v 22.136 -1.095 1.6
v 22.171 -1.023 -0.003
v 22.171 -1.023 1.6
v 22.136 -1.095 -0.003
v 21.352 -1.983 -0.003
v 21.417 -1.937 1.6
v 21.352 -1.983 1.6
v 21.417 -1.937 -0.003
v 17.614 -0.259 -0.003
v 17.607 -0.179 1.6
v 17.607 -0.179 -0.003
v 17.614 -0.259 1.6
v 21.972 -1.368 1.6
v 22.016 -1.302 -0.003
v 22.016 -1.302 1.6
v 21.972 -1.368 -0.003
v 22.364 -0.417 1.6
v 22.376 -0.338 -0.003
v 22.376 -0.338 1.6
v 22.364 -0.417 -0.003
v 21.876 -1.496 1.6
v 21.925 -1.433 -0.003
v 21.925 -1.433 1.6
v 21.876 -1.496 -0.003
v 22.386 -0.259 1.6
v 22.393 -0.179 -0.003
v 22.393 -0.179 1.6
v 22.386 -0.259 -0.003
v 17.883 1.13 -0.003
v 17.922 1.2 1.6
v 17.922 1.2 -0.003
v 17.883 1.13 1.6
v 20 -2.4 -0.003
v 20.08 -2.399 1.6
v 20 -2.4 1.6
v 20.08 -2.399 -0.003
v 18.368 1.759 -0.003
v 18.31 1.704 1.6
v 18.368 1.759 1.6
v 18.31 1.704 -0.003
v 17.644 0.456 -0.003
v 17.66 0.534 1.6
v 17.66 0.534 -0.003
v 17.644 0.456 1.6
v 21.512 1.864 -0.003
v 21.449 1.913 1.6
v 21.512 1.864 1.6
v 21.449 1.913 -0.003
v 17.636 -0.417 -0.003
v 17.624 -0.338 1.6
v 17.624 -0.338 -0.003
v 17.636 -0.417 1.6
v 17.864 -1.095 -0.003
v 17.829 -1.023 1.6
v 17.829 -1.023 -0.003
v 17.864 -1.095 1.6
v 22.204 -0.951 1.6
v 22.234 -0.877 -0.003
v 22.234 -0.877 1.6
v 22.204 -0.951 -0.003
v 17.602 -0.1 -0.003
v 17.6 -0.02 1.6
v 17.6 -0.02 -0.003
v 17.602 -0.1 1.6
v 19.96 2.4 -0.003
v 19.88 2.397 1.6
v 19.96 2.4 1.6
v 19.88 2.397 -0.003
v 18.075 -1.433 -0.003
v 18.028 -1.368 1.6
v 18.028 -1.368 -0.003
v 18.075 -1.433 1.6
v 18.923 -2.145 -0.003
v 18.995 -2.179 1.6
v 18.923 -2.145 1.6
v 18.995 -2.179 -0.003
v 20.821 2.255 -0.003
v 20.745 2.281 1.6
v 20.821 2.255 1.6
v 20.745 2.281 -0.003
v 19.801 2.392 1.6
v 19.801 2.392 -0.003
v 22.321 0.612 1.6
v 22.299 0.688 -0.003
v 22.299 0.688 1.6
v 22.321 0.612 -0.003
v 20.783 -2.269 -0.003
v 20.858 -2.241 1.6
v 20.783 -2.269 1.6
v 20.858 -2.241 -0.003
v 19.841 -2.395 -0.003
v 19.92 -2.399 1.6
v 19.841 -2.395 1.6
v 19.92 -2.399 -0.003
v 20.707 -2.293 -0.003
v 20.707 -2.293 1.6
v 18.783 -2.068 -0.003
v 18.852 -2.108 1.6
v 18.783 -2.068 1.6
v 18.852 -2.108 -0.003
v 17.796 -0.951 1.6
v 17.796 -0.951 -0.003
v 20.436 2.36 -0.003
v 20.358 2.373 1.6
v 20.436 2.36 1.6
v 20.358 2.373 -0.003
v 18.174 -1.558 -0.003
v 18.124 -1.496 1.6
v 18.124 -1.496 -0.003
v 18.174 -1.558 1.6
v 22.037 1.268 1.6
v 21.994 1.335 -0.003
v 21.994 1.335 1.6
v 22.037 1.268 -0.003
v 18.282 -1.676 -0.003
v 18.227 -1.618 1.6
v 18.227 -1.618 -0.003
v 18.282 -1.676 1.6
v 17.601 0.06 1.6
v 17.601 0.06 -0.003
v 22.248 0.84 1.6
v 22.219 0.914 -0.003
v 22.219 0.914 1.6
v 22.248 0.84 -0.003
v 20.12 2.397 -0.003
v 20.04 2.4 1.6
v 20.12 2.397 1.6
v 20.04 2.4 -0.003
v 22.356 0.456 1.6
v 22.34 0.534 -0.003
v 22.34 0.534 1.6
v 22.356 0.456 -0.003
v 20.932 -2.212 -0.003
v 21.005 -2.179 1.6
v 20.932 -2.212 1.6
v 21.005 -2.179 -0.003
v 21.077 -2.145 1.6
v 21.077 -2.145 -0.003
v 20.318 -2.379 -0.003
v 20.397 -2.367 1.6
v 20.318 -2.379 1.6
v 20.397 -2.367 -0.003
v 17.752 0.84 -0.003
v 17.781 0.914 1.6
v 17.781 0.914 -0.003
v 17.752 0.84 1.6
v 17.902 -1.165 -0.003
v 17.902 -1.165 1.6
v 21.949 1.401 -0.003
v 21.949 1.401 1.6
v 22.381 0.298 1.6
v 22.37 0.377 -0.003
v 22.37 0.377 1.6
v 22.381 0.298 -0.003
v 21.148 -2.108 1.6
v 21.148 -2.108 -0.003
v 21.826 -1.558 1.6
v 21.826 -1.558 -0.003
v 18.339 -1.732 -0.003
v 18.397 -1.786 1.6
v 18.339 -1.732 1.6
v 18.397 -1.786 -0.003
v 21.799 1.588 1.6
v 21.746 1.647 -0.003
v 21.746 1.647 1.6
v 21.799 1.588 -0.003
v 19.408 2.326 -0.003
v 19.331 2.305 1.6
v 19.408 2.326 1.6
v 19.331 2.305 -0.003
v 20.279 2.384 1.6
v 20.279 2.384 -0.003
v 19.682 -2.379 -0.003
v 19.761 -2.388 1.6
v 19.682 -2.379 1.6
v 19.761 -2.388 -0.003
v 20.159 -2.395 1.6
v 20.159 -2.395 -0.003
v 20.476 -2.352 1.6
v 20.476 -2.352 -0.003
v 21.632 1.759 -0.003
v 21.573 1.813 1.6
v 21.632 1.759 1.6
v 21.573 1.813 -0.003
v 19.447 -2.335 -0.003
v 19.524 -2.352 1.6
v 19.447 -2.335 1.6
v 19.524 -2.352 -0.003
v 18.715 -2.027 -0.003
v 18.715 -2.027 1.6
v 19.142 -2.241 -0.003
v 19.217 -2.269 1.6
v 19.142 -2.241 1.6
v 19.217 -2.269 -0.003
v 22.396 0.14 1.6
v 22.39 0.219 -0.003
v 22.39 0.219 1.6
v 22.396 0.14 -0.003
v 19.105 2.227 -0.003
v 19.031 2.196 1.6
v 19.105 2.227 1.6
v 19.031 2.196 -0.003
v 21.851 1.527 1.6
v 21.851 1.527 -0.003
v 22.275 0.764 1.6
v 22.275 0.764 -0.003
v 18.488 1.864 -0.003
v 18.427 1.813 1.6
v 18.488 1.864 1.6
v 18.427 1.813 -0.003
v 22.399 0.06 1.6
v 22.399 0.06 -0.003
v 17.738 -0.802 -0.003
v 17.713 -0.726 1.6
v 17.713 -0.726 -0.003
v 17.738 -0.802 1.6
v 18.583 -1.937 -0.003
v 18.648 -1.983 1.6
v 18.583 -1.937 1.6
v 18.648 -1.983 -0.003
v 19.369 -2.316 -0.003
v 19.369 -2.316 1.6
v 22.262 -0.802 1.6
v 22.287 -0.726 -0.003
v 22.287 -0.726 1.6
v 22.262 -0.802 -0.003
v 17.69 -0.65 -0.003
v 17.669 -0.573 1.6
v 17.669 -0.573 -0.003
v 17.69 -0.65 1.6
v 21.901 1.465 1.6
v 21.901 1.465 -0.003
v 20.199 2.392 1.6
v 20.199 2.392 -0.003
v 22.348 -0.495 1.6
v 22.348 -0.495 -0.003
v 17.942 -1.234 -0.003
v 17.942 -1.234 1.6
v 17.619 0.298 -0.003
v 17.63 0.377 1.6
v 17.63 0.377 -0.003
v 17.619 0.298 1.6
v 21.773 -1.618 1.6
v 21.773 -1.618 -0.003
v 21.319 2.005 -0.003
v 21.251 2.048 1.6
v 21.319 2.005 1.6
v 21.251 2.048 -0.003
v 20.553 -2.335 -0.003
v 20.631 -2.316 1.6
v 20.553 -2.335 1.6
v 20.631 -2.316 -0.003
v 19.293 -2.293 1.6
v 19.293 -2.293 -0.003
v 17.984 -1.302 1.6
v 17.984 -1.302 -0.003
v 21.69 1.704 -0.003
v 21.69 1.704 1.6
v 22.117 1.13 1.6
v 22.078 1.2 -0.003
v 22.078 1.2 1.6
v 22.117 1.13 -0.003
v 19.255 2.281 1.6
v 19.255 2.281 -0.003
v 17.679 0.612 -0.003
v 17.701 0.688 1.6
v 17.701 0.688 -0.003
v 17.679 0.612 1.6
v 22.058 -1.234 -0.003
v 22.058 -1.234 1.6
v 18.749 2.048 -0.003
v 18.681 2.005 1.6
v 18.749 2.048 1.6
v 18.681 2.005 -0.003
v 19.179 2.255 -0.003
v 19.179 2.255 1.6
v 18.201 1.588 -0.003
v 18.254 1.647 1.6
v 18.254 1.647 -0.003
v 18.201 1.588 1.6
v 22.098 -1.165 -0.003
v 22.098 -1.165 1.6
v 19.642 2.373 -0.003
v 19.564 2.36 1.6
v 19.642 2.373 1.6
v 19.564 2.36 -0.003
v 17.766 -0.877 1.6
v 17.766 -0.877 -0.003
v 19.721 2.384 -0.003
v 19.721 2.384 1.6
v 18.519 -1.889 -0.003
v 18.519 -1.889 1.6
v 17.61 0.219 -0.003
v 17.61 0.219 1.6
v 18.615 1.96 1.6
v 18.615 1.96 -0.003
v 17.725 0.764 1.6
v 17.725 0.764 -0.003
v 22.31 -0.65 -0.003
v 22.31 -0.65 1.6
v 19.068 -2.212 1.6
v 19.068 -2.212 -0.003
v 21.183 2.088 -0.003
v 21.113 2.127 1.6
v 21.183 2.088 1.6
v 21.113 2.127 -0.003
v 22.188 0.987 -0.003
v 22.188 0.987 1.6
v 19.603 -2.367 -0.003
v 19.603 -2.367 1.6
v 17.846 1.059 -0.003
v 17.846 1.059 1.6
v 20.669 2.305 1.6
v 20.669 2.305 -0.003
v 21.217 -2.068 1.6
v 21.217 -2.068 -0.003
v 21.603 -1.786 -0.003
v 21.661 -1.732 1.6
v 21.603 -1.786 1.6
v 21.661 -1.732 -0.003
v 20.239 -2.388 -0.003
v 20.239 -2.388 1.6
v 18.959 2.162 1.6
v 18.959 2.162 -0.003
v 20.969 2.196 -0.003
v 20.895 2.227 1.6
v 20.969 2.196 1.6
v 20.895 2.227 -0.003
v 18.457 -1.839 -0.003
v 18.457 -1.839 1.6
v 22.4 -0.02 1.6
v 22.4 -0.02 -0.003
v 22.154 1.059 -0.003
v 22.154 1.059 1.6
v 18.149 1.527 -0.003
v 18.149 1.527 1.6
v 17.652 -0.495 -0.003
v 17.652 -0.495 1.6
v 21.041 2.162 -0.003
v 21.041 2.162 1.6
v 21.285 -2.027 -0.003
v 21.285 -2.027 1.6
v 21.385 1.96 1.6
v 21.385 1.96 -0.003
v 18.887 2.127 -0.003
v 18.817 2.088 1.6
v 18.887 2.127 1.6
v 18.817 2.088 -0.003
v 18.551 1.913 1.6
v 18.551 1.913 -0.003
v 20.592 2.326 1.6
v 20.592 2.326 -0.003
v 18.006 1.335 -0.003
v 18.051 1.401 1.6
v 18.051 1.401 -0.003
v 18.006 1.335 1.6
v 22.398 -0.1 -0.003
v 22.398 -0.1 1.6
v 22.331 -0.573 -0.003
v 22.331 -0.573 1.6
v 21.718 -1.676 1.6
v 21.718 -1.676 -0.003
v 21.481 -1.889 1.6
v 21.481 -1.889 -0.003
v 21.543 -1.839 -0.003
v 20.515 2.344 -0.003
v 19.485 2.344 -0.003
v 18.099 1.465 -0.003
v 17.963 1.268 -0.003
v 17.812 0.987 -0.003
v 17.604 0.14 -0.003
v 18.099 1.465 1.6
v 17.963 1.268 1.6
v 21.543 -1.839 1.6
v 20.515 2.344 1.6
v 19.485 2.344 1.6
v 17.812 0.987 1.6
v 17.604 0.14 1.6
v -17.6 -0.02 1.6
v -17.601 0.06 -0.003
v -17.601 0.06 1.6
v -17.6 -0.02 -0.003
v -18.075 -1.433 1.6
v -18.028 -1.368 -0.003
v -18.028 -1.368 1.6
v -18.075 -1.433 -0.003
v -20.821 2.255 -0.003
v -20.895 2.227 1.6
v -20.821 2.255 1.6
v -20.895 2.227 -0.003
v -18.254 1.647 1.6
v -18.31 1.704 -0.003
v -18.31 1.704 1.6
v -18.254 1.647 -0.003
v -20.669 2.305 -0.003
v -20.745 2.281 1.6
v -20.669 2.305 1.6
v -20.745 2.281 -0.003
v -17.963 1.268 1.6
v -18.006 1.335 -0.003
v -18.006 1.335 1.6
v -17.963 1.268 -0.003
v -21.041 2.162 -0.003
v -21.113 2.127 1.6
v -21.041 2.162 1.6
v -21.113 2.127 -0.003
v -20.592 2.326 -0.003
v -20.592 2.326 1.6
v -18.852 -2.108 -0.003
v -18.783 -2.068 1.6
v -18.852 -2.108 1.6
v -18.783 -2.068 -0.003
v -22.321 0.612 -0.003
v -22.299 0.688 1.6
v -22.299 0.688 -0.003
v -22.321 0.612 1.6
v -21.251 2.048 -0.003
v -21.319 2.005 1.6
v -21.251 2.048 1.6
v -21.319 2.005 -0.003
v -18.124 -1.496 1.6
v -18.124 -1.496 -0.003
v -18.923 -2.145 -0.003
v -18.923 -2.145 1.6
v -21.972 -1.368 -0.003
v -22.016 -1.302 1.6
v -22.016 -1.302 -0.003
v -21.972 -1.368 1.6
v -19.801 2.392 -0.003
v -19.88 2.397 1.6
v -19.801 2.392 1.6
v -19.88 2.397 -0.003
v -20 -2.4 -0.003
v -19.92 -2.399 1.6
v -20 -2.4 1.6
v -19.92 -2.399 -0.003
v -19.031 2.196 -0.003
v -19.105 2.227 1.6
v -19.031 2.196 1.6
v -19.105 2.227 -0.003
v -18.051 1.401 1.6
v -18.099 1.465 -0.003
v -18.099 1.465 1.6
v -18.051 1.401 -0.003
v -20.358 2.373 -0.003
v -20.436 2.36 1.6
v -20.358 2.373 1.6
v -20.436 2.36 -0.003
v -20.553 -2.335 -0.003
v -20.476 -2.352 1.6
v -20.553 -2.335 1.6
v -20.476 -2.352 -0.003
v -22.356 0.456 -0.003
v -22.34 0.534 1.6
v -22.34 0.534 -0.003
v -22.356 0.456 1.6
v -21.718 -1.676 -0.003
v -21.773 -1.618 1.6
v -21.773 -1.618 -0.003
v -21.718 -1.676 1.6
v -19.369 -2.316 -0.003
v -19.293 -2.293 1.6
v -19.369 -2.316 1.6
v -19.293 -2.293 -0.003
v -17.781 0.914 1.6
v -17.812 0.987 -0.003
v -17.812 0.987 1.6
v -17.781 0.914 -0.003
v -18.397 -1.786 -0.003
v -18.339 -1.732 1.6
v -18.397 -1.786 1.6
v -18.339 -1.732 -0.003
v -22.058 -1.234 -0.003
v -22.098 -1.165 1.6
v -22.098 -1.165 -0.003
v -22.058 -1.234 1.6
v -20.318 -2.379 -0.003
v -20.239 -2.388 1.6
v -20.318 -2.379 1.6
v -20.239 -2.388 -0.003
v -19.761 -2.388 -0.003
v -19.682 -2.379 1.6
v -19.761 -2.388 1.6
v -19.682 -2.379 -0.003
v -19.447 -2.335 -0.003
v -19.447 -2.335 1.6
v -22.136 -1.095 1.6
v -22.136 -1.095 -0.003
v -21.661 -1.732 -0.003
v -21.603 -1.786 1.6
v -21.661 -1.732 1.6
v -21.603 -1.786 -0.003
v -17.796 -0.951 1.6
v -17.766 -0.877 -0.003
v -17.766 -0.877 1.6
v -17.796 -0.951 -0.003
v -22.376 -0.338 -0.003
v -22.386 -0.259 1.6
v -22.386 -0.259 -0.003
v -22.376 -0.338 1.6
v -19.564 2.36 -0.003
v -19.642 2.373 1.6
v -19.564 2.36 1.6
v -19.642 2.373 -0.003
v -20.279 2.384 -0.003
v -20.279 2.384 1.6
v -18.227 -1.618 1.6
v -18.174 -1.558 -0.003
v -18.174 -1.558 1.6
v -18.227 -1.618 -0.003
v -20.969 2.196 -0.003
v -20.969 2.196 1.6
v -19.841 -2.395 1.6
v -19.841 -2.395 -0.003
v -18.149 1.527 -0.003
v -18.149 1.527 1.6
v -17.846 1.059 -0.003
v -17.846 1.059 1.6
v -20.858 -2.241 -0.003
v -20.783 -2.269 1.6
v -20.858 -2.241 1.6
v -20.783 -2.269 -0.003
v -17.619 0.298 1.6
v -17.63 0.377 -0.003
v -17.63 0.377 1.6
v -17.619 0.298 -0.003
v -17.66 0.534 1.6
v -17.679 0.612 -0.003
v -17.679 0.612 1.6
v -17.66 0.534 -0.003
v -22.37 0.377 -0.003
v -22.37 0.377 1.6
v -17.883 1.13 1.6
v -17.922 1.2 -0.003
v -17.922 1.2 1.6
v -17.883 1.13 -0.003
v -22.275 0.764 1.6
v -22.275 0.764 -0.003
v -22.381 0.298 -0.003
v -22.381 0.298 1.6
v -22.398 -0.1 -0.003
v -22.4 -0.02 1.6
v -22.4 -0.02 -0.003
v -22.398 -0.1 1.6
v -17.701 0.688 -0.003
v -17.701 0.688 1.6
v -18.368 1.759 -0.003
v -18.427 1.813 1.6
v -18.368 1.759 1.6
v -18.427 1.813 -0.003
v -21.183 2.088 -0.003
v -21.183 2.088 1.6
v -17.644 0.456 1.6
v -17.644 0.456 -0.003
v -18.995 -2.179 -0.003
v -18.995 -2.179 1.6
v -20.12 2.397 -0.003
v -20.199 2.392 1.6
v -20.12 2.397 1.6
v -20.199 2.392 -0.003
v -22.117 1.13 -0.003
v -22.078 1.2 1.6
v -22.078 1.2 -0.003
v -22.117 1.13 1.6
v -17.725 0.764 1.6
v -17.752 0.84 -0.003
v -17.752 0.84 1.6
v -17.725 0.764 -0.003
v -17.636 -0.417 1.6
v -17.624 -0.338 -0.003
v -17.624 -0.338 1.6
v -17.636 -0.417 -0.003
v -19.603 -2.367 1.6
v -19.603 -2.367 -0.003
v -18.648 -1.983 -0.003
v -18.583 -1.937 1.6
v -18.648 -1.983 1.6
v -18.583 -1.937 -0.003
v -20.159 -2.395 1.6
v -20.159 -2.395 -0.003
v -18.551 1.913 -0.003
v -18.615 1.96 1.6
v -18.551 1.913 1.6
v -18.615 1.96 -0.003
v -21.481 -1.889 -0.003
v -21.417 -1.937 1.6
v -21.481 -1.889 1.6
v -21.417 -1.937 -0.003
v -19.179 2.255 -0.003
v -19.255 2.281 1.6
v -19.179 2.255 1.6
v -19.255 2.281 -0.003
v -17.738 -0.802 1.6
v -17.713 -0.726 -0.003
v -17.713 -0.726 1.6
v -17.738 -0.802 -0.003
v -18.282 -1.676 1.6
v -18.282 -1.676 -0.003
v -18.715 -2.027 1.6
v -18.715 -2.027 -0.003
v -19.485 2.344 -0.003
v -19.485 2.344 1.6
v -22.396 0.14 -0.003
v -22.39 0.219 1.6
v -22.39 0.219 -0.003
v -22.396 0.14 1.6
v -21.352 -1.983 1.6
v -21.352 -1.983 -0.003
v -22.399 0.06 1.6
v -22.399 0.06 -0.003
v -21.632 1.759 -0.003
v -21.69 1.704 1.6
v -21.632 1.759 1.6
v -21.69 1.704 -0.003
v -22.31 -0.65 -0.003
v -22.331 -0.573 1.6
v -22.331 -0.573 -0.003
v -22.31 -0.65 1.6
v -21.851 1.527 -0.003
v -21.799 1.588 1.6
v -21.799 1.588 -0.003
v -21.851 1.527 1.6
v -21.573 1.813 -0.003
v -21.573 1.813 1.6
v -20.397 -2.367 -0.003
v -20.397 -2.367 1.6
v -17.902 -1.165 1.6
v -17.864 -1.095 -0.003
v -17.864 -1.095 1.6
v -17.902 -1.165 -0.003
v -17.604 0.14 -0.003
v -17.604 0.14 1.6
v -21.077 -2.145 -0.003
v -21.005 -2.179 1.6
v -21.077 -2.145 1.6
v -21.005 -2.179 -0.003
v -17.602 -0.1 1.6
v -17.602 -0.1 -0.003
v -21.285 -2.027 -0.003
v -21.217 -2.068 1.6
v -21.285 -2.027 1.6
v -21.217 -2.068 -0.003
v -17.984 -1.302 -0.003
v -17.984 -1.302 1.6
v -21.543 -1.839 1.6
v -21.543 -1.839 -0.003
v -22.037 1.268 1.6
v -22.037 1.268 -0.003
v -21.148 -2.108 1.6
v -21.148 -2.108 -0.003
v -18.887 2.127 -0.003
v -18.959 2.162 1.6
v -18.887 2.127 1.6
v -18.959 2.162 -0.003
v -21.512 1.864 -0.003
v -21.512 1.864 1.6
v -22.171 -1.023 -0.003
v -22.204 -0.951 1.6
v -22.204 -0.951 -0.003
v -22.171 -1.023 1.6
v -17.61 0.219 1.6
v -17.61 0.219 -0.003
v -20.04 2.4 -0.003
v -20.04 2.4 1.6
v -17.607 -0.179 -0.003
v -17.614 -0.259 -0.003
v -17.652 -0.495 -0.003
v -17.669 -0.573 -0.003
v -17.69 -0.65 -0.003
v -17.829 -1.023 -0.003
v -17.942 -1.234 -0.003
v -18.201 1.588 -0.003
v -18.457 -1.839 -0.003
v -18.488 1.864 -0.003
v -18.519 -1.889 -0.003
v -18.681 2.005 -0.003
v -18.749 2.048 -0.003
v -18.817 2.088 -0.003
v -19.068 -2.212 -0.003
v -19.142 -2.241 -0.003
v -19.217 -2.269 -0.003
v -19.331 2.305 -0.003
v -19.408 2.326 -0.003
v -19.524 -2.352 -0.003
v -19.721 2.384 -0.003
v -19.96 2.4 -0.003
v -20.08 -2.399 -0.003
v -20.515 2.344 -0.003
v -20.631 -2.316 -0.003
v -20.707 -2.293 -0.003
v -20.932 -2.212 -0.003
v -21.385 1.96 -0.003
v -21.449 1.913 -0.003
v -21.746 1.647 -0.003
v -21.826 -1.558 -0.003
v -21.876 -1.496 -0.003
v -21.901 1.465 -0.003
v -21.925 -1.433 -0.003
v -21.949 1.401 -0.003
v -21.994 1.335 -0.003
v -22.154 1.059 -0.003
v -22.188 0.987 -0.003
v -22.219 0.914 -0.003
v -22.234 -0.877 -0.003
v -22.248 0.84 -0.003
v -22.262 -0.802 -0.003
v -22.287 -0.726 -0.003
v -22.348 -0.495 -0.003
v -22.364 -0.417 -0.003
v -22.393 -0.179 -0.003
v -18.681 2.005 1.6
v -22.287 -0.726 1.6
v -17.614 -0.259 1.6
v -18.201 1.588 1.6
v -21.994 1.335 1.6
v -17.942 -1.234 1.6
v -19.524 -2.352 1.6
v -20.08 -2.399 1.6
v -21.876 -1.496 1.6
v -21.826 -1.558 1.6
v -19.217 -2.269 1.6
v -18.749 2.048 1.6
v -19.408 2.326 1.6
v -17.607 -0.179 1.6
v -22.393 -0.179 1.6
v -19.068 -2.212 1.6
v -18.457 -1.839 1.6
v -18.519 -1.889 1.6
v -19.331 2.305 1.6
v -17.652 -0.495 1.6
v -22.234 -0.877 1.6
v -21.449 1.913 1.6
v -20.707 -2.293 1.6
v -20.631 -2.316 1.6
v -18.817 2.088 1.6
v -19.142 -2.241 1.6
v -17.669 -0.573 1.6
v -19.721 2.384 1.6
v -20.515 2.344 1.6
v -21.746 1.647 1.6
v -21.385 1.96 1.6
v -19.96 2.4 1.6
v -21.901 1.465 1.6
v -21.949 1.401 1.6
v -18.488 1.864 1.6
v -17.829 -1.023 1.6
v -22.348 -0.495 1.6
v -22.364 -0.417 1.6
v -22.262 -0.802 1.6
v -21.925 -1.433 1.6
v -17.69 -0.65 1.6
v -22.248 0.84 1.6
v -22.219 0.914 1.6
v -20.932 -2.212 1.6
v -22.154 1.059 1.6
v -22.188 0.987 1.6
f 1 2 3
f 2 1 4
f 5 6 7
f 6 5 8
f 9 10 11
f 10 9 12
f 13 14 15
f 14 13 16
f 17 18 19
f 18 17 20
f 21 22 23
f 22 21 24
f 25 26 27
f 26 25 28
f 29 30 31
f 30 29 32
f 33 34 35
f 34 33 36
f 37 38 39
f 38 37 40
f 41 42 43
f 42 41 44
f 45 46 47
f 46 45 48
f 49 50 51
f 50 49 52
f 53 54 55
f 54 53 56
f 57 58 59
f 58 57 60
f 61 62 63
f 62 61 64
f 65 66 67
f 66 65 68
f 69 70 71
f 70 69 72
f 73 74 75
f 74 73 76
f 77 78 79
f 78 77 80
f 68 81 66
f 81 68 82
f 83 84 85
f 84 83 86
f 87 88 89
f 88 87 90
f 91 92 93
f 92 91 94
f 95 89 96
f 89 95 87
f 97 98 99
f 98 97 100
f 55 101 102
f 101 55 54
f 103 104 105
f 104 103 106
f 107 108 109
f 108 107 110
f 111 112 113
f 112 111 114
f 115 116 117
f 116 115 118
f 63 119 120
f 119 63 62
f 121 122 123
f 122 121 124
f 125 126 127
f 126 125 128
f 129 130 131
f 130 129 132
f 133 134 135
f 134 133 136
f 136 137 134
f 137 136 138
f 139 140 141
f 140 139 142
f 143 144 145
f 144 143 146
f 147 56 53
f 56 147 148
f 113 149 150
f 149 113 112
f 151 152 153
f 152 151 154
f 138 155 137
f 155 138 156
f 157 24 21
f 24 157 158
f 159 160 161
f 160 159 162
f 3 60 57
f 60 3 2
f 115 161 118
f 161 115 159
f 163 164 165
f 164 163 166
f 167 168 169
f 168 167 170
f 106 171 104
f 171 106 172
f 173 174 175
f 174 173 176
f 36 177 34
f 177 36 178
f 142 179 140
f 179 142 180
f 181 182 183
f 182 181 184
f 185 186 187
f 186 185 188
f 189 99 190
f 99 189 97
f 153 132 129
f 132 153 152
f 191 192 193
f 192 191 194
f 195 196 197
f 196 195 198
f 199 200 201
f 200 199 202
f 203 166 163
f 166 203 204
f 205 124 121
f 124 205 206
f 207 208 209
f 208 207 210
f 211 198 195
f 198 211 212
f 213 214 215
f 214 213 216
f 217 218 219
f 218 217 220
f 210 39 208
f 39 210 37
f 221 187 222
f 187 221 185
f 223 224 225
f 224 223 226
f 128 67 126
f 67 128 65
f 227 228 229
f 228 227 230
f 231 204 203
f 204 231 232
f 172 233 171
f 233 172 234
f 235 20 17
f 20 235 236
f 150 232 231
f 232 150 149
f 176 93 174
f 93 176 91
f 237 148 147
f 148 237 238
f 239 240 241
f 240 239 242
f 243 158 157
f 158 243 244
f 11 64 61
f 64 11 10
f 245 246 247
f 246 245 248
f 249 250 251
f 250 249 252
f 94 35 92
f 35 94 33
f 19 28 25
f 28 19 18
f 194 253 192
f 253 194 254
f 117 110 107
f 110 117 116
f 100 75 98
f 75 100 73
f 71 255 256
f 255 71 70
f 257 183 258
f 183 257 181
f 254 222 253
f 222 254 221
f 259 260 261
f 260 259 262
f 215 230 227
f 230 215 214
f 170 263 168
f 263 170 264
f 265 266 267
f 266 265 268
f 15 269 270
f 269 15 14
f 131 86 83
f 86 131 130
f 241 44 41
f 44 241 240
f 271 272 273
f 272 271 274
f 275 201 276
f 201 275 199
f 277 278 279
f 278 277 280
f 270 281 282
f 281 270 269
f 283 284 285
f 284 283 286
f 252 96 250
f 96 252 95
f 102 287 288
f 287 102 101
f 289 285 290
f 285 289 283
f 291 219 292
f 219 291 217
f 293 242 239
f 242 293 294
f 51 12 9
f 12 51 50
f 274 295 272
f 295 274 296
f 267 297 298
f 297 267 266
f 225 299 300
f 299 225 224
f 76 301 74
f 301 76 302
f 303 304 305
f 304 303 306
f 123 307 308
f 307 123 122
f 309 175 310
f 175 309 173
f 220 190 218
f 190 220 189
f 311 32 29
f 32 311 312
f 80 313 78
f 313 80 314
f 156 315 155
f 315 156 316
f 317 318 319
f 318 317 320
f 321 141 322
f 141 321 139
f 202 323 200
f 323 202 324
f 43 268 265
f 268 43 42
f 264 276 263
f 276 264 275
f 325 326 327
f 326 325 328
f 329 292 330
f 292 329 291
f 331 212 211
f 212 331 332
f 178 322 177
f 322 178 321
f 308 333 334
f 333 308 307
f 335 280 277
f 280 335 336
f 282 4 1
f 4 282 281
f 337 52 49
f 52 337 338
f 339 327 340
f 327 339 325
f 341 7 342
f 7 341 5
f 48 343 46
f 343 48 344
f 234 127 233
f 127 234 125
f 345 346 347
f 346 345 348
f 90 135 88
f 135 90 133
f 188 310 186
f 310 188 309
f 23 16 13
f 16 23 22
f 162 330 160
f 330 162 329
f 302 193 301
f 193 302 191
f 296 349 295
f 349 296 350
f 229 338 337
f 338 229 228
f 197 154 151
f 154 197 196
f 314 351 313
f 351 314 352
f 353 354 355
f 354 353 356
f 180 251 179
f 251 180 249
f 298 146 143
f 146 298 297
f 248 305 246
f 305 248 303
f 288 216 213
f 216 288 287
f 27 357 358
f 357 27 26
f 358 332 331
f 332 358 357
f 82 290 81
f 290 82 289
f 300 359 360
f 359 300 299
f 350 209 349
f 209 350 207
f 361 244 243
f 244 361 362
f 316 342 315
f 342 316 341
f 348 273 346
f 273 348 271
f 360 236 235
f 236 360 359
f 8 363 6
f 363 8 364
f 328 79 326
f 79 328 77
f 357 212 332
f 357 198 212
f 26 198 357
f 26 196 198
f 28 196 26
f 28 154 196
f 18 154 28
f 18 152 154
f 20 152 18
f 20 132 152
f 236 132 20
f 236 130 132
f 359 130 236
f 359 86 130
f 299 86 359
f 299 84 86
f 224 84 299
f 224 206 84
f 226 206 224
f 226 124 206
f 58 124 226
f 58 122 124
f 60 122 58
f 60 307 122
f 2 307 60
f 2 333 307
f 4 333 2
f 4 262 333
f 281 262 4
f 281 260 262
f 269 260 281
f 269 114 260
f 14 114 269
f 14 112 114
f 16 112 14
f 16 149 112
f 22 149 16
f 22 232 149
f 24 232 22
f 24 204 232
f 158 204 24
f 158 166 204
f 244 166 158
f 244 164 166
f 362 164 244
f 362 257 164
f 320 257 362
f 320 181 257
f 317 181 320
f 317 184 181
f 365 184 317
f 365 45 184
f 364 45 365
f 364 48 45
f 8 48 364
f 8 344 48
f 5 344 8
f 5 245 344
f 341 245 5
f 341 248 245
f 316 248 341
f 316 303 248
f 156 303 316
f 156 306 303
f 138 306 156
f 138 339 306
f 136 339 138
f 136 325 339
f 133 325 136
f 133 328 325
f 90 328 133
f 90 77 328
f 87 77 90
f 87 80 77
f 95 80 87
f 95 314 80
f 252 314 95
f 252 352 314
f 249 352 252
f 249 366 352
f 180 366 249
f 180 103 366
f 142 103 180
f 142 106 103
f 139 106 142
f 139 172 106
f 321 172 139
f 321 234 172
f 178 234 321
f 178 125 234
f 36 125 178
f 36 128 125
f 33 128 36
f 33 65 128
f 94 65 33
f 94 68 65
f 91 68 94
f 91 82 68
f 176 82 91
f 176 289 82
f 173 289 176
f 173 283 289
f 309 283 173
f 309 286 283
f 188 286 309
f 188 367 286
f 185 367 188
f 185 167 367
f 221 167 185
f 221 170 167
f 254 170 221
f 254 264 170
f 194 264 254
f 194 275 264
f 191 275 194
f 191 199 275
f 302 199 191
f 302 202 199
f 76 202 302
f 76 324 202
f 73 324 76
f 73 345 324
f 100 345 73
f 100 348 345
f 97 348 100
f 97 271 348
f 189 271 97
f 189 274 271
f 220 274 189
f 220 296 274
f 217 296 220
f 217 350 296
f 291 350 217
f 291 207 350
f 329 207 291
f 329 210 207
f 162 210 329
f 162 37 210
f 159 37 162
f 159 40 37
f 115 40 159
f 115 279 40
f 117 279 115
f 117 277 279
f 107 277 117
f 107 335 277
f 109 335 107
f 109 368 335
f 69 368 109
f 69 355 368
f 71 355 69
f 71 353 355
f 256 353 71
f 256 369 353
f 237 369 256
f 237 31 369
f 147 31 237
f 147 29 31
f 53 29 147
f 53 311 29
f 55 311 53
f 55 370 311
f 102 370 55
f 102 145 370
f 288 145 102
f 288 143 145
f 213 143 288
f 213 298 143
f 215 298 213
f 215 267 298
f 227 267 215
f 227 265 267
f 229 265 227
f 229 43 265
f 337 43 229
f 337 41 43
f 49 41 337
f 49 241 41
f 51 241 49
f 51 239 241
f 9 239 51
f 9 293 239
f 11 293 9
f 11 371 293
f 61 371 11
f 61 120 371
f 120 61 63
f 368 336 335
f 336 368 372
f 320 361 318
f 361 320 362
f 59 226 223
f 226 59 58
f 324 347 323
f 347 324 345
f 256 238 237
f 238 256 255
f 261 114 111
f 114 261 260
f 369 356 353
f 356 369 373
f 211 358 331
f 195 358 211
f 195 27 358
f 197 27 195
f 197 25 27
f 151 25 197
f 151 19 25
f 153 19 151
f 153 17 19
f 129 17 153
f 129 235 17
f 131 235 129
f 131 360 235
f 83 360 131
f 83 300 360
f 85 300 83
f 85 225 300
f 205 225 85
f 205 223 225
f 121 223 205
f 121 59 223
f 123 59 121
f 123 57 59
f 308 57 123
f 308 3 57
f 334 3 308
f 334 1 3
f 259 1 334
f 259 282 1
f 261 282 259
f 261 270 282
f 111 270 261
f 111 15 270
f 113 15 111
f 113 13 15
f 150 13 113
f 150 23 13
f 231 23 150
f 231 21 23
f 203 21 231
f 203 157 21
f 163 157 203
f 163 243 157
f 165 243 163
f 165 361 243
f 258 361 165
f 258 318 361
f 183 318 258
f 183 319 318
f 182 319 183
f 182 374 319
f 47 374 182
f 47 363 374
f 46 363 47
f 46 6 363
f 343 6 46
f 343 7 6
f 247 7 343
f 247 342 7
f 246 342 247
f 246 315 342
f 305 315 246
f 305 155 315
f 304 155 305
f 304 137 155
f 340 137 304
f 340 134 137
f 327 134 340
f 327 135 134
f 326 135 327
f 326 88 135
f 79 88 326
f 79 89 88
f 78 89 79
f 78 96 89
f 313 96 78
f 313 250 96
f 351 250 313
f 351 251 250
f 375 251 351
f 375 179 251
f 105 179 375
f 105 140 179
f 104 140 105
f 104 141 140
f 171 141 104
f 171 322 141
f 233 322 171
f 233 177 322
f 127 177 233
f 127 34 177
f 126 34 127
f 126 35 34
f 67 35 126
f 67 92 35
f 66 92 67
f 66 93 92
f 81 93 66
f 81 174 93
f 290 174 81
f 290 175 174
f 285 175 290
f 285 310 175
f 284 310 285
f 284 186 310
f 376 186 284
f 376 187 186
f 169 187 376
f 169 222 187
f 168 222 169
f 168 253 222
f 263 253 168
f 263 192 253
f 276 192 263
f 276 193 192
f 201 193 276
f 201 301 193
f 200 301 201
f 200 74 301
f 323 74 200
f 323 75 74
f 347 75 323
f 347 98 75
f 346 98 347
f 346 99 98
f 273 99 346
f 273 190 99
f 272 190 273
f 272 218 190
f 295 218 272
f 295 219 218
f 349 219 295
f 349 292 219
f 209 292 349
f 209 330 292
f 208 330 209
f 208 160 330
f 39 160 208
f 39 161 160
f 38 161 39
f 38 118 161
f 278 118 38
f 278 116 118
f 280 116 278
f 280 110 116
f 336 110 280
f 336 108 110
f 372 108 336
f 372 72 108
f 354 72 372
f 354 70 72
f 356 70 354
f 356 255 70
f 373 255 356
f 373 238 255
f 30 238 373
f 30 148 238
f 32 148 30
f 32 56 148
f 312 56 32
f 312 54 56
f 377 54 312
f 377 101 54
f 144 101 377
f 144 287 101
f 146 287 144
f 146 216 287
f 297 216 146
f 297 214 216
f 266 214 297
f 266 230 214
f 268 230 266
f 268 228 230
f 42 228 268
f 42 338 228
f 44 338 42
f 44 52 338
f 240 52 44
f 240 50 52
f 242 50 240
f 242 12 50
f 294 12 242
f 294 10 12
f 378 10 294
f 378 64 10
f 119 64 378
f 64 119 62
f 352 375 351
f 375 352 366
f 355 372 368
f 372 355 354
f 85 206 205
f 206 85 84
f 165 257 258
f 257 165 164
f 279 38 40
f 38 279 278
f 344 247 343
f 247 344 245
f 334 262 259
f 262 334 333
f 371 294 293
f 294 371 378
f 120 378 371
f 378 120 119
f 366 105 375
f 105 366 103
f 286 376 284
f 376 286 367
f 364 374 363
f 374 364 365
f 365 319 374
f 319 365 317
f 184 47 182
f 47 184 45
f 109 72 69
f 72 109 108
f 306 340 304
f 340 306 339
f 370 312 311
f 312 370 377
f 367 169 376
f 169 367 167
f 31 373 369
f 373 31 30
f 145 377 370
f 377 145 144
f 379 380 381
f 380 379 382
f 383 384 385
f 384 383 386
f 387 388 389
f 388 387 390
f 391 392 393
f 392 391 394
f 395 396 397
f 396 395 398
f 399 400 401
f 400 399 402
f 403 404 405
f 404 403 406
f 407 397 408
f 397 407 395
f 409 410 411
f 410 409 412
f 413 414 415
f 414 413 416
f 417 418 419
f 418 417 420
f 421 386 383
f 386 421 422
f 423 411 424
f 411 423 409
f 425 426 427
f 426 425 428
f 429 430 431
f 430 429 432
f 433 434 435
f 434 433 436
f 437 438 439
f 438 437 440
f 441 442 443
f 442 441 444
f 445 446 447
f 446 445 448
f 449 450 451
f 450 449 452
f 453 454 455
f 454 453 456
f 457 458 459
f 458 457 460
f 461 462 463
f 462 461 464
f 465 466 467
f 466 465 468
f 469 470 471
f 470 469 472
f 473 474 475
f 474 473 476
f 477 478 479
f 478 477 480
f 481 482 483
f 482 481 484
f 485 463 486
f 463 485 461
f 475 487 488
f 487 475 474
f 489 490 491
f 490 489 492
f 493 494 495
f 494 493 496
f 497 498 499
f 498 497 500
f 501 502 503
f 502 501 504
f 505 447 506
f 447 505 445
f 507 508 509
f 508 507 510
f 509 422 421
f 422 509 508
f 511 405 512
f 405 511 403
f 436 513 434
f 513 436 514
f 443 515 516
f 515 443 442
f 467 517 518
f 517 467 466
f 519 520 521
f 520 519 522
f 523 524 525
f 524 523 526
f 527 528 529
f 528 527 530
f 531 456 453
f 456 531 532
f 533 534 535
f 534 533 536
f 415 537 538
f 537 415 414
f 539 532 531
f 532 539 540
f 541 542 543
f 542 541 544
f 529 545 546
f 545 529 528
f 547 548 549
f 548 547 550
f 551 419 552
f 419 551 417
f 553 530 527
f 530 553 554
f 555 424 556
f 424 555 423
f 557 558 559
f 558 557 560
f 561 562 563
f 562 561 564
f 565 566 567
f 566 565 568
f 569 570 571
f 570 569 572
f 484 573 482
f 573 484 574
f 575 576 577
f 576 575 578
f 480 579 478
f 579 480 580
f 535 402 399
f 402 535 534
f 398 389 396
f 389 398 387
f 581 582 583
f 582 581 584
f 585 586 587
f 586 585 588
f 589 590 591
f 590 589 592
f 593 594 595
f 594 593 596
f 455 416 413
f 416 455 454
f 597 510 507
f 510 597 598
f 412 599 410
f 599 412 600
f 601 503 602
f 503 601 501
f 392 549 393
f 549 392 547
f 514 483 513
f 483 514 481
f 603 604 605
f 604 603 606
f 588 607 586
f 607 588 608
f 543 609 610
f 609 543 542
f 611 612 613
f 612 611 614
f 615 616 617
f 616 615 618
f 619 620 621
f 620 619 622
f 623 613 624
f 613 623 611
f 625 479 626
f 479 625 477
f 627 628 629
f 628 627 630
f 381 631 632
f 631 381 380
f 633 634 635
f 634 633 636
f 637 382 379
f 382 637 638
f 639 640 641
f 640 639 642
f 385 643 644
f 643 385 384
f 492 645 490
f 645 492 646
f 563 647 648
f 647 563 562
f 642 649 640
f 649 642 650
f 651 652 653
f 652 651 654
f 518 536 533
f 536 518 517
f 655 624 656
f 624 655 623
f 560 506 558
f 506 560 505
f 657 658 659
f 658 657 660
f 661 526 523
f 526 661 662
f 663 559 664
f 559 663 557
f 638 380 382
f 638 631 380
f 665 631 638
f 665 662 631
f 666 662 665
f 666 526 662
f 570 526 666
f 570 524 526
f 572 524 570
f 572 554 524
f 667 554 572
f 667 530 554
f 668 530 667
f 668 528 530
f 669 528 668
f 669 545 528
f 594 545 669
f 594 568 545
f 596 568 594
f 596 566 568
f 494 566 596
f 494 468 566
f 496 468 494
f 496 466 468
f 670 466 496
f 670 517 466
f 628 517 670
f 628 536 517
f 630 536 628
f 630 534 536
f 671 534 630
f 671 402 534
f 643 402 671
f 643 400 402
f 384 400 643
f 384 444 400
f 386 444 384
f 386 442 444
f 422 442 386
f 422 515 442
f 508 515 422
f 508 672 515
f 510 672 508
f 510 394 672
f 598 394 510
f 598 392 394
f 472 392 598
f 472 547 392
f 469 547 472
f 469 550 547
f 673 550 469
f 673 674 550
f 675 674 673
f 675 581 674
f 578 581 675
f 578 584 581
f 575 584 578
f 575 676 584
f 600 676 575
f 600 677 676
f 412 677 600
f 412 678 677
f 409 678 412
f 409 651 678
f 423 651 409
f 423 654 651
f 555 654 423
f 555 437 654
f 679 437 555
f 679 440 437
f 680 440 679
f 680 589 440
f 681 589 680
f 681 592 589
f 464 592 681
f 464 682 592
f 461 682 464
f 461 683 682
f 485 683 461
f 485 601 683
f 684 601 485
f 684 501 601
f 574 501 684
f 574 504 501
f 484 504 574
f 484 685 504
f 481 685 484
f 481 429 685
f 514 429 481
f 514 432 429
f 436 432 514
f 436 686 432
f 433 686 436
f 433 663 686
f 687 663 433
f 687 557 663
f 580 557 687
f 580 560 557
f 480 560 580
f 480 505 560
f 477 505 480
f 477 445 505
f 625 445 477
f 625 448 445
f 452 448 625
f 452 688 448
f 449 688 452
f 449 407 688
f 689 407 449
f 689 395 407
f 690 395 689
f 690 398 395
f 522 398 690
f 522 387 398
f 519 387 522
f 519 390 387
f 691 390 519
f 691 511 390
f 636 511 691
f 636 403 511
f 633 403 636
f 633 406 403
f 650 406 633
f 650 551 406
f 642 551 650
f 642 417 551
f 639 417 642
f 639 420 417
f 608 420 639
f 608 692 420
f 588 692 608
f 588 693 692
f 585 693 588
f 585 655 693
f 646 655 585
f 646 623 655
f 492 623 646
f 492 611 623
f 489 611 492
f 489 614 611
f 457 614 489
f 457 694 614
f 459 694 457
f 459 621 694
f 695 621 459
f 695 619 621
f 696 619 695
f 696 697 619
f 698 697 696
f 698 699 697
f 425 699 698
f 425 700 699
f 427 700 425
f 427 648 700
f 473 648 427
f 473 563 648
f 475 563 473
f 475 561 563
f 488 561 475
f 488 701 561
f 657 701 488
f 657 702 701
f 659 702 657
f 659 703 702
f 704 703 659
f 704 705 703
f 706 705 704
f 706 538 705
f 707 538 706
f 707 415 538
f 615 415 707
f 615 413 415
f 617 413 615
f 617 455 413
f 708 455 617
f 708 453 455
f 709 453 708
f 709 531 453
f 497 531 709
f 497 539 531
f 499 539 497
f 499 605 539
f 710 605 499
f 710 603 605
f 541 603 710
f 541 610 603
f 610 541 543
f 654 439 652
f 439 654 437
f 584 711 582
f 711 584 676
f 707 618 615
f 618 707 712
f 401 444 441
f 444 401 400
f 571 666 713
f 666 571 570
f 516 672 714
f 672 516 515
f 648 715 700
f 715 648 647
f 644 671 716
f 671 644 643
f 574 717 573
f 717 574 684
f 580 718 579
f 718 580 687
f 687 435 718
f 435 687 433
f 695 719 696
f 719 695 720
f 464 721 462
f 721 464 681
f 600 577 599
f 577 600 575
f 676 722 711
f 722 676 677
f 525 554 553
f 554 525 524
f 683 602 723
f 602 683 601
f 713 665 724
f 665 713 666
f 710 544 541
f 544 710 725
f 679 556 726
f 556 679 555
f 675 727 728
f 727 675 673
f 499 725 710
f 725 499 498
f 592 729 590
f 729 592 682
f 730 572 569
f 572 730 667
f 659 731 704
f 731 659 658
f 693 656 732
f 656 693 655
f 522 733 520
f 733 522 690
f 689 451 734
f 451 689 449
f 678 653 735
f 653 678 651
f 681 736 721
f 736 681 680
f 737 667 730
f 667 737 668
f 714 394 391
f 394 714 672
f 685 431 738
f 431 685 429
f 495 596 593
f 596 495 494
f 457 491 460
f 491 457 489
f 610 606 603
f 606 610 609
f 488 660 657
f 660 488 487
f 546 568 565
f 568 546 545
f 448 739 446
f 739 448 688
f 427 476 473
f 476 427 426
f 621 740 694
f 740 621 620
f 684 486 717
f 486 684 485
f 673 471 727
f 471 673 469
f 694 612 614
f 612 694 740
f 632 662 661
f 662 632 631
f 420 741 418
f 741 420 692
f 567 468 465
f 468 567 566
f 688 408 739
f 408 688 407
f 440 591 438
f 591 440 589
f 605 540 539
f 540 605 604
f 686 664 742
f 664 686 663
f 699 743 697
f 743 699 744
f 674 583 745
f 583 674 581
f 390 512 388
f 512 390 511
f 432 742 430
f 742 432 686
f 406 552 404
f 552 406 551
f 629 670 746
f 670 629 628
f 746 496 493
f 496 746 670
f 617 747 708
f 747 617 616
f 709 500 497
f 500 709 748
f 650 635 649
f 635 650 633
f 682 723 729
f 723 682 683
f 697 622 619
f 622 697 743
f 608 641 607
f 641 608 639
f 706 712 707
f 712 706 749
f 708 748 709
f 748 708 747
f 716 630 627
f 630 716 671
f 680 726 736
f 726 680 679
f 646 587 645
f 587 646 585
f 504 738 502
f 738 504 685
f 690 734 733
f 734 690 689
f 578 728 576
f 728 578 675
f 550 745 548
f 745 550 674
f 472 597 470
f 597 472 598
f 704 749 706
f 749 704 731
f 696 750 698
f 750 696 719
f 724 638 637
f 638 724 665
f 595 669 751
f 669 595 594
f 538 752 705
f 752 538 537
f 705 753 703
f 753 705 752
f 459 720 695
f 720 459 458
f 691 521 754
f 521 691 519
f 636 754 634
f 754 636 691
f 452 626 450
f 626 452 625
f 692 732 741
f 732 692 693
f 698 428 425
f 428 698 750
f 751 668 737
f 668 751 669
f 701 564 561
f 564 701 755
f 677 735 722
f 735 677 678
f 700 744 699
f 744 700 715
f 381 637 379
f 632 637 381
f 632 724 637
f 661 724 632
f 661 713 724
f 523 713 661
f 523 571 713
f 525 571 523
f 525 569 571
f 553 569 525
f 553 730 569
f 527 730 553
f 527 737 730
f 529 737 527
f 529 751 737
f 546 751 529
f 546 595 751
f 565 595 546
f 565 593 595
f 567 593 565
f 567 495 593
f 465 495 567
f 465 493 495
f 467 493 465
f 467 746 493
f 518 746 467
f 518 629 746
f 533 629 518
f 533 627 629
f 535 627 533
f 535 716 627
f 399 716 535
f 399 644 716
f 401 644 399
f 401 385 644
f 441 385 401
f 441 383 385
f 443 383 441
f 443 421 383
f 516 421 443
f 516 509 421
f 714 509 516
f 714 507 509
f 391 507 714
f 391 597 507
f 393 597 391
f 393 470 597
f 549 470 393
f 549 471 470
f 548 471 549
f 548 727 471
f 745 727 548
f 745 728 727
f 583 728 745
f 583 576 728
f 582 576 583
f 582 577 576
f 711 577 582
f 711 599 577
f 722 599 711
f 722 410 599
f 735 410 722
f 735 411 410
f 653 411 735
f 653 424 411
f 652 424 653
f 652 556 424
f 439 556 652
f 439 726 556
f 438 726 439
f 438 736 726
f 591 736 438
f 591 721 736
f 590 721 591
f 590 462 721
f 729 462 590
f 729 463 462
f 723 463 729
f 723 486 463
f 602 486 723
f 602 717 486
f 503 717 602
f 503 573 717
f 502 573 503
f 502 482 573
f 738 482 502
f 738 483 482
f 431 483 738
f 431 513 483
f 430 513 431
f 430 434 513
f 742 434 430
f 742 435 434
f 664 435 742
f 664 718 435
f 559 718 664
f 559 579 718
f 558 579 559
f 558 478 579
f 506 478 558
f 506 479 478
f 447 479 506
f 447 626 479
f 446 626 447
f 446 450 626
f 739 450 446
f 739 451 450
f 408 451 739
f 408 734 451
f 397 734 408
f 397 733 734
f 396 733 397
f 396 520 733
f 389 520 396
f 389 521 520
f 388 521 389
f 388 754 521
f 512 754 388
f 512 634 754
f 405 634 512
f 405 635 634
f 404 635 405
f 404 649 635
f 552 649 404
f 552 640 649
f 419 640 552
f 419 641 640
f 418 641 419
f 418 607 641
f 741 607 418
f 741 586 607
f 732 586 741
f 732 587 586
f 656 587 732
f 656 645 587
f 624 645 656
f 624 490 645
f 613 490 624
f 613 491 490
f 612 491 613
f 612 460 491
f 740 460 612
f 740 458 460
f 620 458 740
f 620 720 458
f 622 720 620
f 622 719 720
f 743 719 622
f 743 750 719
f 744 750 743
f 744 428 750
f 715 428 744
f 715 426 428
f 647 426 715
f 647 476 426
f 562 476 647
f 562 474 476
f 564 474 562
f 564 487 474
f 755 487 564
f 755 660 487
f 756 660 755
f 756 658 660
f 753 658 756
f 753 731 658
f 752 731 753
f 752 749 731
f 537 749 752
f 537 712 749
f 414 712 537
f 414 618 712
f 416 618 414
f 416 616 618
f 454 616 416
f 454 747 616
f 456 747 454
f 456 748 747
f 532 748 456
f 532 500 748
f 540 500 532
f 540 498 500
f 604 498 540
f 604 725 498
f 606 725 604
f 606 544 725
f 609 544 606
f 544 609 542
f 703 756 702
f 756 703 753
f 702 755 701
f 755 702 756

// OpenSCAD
use <../lib.scad>
use <s/3939p91a.scad>
use <s/3939p91b.scad>
use <s/3939s01.scad>
$fa=1; $fs=0.2;
function ldraw_lib__3939p90(realsolid=false) = [
// 0 Slope Brick 33  3 x  6 with Classic Space Small Pattern
// 0 Name: 3939p90.dat
// 0 Author: Chris Dee [cwdee]
// 0 !LDRAW_ORG Part UPDATE 2014-01
// 0 !LICENSE Licensed under CC BY 2.0 and CC BY 4.0 : see CAreadme.txt
// 
// 0 BFC CERTIFY CW
  [0,"BFC","CERTIFY"],
  [0,"BFC","CW"],
// 
// 0 !KEYWORDS beta-1 command base, Moon, planet
// 
// 0 !HISTORY 2001-12-31 [PTadmin] Official Update 2001-03
// 0 !HISTORY 2002-08-19 [Holly-Wood] refined pattern, added missing craters
// 0 !HISTORY 2002-12-31 [PTadmin] Official Update 2002-06
// 0 !HISTORY 2003-07-11 [Steffen] made use of subfile s\3939s01.dat
// 0 !HISTORY 2004-03-16 [Holly-Wood] separated pattern into subpart, made BFC compliant
// 0 !HISTORY 2004-04-22 [PTadmin] Official Update 2004-02
// 0 !HISTORY 2007-06-30 [PTadmin] Header formatted for Contributor Agreement
// 0 !HISTORY 2008-07-01 [PTadmin] Official Update 2008-01
// 0 !HISTORY 2013-08-10 [Steffen] replaced gold color by 82
// 0 !HISTORY 2014-06-21 [PTadmin] Official Update 2014-01
// 
// 
// 4 16 60 0 -10 60 20 -50 26.4 15.7525 -41.505 26.4 4.2475 -18.495
  [4,16,60,0,-10,60,20,-50,26.4,15.7525,-41.505,26.4,4.2475,-18.495],
// 4 16 -60 20 -50 -26.4 15.7525 -41.505 26.4 15.7525 -41.505 60 20 -50
  [4,16,-60,20,-50,-26.4,15.7525,-41.505,26.4,15.7525,-41.505,60,20,-50],
// 4 16 -26.4 4.2475 -18.495 -26.4 15.7525 -41.505 -60 20 -50 -60 0 -10
  [4,16,-26.4,4.2475,-18.495,-26.4,15.7525,-41.505,-60,20,-50,-60,0,-10],
// 4 16 -60 0 -10 60 0 -10 26.4 4.2475 -18.495 -26.4 4.2475 -18.495
  [4,16,-60,0,-10,60,0,-10,26.4,4.2475,-18.495,-26.4,4.2475,-18.495],
// 1 16 0 0 0 1 0 0 0 1 0 0 0 1 s\3939s01.dat
  [1,16,0,0,0,1,0,0,0,1,0,0,0,1, ldraw_lib__s__3939s01(realsolid)],
// 1 82 0 10 -30 0.66 0 0 0 0.894 -0.295 0 0.447 0.59 s\3939p91a.dat
  [1,82,0,10,-30,0.66,0,0,0,0.894,-0.295,0,0.447,0.59, ldraw_lib__s__3939p91a(realsolid)],
// 1 16 0 10 -30 0.66 0 0 0 0.894 -0.295 0 0.447 0.59 s\3939p91b.dat
  [1,16,0,10,-30,0.66,0,0,0,0.894,-0.295,0,0.447,0.59, ldraw_lib__s__3939p91b(realsolid)],
];
module ldraw_lib__3939p90(step=0, col=false, unit=2/5, alt=false, line=0.2, solid=!$preview)
    makepoly(ldraw_lib__3939p90(solid), step=step, col=col, unit=unit, alt=alt, line=line, solid=solid);
ldraw_lib__3939p90(line=0.2);
